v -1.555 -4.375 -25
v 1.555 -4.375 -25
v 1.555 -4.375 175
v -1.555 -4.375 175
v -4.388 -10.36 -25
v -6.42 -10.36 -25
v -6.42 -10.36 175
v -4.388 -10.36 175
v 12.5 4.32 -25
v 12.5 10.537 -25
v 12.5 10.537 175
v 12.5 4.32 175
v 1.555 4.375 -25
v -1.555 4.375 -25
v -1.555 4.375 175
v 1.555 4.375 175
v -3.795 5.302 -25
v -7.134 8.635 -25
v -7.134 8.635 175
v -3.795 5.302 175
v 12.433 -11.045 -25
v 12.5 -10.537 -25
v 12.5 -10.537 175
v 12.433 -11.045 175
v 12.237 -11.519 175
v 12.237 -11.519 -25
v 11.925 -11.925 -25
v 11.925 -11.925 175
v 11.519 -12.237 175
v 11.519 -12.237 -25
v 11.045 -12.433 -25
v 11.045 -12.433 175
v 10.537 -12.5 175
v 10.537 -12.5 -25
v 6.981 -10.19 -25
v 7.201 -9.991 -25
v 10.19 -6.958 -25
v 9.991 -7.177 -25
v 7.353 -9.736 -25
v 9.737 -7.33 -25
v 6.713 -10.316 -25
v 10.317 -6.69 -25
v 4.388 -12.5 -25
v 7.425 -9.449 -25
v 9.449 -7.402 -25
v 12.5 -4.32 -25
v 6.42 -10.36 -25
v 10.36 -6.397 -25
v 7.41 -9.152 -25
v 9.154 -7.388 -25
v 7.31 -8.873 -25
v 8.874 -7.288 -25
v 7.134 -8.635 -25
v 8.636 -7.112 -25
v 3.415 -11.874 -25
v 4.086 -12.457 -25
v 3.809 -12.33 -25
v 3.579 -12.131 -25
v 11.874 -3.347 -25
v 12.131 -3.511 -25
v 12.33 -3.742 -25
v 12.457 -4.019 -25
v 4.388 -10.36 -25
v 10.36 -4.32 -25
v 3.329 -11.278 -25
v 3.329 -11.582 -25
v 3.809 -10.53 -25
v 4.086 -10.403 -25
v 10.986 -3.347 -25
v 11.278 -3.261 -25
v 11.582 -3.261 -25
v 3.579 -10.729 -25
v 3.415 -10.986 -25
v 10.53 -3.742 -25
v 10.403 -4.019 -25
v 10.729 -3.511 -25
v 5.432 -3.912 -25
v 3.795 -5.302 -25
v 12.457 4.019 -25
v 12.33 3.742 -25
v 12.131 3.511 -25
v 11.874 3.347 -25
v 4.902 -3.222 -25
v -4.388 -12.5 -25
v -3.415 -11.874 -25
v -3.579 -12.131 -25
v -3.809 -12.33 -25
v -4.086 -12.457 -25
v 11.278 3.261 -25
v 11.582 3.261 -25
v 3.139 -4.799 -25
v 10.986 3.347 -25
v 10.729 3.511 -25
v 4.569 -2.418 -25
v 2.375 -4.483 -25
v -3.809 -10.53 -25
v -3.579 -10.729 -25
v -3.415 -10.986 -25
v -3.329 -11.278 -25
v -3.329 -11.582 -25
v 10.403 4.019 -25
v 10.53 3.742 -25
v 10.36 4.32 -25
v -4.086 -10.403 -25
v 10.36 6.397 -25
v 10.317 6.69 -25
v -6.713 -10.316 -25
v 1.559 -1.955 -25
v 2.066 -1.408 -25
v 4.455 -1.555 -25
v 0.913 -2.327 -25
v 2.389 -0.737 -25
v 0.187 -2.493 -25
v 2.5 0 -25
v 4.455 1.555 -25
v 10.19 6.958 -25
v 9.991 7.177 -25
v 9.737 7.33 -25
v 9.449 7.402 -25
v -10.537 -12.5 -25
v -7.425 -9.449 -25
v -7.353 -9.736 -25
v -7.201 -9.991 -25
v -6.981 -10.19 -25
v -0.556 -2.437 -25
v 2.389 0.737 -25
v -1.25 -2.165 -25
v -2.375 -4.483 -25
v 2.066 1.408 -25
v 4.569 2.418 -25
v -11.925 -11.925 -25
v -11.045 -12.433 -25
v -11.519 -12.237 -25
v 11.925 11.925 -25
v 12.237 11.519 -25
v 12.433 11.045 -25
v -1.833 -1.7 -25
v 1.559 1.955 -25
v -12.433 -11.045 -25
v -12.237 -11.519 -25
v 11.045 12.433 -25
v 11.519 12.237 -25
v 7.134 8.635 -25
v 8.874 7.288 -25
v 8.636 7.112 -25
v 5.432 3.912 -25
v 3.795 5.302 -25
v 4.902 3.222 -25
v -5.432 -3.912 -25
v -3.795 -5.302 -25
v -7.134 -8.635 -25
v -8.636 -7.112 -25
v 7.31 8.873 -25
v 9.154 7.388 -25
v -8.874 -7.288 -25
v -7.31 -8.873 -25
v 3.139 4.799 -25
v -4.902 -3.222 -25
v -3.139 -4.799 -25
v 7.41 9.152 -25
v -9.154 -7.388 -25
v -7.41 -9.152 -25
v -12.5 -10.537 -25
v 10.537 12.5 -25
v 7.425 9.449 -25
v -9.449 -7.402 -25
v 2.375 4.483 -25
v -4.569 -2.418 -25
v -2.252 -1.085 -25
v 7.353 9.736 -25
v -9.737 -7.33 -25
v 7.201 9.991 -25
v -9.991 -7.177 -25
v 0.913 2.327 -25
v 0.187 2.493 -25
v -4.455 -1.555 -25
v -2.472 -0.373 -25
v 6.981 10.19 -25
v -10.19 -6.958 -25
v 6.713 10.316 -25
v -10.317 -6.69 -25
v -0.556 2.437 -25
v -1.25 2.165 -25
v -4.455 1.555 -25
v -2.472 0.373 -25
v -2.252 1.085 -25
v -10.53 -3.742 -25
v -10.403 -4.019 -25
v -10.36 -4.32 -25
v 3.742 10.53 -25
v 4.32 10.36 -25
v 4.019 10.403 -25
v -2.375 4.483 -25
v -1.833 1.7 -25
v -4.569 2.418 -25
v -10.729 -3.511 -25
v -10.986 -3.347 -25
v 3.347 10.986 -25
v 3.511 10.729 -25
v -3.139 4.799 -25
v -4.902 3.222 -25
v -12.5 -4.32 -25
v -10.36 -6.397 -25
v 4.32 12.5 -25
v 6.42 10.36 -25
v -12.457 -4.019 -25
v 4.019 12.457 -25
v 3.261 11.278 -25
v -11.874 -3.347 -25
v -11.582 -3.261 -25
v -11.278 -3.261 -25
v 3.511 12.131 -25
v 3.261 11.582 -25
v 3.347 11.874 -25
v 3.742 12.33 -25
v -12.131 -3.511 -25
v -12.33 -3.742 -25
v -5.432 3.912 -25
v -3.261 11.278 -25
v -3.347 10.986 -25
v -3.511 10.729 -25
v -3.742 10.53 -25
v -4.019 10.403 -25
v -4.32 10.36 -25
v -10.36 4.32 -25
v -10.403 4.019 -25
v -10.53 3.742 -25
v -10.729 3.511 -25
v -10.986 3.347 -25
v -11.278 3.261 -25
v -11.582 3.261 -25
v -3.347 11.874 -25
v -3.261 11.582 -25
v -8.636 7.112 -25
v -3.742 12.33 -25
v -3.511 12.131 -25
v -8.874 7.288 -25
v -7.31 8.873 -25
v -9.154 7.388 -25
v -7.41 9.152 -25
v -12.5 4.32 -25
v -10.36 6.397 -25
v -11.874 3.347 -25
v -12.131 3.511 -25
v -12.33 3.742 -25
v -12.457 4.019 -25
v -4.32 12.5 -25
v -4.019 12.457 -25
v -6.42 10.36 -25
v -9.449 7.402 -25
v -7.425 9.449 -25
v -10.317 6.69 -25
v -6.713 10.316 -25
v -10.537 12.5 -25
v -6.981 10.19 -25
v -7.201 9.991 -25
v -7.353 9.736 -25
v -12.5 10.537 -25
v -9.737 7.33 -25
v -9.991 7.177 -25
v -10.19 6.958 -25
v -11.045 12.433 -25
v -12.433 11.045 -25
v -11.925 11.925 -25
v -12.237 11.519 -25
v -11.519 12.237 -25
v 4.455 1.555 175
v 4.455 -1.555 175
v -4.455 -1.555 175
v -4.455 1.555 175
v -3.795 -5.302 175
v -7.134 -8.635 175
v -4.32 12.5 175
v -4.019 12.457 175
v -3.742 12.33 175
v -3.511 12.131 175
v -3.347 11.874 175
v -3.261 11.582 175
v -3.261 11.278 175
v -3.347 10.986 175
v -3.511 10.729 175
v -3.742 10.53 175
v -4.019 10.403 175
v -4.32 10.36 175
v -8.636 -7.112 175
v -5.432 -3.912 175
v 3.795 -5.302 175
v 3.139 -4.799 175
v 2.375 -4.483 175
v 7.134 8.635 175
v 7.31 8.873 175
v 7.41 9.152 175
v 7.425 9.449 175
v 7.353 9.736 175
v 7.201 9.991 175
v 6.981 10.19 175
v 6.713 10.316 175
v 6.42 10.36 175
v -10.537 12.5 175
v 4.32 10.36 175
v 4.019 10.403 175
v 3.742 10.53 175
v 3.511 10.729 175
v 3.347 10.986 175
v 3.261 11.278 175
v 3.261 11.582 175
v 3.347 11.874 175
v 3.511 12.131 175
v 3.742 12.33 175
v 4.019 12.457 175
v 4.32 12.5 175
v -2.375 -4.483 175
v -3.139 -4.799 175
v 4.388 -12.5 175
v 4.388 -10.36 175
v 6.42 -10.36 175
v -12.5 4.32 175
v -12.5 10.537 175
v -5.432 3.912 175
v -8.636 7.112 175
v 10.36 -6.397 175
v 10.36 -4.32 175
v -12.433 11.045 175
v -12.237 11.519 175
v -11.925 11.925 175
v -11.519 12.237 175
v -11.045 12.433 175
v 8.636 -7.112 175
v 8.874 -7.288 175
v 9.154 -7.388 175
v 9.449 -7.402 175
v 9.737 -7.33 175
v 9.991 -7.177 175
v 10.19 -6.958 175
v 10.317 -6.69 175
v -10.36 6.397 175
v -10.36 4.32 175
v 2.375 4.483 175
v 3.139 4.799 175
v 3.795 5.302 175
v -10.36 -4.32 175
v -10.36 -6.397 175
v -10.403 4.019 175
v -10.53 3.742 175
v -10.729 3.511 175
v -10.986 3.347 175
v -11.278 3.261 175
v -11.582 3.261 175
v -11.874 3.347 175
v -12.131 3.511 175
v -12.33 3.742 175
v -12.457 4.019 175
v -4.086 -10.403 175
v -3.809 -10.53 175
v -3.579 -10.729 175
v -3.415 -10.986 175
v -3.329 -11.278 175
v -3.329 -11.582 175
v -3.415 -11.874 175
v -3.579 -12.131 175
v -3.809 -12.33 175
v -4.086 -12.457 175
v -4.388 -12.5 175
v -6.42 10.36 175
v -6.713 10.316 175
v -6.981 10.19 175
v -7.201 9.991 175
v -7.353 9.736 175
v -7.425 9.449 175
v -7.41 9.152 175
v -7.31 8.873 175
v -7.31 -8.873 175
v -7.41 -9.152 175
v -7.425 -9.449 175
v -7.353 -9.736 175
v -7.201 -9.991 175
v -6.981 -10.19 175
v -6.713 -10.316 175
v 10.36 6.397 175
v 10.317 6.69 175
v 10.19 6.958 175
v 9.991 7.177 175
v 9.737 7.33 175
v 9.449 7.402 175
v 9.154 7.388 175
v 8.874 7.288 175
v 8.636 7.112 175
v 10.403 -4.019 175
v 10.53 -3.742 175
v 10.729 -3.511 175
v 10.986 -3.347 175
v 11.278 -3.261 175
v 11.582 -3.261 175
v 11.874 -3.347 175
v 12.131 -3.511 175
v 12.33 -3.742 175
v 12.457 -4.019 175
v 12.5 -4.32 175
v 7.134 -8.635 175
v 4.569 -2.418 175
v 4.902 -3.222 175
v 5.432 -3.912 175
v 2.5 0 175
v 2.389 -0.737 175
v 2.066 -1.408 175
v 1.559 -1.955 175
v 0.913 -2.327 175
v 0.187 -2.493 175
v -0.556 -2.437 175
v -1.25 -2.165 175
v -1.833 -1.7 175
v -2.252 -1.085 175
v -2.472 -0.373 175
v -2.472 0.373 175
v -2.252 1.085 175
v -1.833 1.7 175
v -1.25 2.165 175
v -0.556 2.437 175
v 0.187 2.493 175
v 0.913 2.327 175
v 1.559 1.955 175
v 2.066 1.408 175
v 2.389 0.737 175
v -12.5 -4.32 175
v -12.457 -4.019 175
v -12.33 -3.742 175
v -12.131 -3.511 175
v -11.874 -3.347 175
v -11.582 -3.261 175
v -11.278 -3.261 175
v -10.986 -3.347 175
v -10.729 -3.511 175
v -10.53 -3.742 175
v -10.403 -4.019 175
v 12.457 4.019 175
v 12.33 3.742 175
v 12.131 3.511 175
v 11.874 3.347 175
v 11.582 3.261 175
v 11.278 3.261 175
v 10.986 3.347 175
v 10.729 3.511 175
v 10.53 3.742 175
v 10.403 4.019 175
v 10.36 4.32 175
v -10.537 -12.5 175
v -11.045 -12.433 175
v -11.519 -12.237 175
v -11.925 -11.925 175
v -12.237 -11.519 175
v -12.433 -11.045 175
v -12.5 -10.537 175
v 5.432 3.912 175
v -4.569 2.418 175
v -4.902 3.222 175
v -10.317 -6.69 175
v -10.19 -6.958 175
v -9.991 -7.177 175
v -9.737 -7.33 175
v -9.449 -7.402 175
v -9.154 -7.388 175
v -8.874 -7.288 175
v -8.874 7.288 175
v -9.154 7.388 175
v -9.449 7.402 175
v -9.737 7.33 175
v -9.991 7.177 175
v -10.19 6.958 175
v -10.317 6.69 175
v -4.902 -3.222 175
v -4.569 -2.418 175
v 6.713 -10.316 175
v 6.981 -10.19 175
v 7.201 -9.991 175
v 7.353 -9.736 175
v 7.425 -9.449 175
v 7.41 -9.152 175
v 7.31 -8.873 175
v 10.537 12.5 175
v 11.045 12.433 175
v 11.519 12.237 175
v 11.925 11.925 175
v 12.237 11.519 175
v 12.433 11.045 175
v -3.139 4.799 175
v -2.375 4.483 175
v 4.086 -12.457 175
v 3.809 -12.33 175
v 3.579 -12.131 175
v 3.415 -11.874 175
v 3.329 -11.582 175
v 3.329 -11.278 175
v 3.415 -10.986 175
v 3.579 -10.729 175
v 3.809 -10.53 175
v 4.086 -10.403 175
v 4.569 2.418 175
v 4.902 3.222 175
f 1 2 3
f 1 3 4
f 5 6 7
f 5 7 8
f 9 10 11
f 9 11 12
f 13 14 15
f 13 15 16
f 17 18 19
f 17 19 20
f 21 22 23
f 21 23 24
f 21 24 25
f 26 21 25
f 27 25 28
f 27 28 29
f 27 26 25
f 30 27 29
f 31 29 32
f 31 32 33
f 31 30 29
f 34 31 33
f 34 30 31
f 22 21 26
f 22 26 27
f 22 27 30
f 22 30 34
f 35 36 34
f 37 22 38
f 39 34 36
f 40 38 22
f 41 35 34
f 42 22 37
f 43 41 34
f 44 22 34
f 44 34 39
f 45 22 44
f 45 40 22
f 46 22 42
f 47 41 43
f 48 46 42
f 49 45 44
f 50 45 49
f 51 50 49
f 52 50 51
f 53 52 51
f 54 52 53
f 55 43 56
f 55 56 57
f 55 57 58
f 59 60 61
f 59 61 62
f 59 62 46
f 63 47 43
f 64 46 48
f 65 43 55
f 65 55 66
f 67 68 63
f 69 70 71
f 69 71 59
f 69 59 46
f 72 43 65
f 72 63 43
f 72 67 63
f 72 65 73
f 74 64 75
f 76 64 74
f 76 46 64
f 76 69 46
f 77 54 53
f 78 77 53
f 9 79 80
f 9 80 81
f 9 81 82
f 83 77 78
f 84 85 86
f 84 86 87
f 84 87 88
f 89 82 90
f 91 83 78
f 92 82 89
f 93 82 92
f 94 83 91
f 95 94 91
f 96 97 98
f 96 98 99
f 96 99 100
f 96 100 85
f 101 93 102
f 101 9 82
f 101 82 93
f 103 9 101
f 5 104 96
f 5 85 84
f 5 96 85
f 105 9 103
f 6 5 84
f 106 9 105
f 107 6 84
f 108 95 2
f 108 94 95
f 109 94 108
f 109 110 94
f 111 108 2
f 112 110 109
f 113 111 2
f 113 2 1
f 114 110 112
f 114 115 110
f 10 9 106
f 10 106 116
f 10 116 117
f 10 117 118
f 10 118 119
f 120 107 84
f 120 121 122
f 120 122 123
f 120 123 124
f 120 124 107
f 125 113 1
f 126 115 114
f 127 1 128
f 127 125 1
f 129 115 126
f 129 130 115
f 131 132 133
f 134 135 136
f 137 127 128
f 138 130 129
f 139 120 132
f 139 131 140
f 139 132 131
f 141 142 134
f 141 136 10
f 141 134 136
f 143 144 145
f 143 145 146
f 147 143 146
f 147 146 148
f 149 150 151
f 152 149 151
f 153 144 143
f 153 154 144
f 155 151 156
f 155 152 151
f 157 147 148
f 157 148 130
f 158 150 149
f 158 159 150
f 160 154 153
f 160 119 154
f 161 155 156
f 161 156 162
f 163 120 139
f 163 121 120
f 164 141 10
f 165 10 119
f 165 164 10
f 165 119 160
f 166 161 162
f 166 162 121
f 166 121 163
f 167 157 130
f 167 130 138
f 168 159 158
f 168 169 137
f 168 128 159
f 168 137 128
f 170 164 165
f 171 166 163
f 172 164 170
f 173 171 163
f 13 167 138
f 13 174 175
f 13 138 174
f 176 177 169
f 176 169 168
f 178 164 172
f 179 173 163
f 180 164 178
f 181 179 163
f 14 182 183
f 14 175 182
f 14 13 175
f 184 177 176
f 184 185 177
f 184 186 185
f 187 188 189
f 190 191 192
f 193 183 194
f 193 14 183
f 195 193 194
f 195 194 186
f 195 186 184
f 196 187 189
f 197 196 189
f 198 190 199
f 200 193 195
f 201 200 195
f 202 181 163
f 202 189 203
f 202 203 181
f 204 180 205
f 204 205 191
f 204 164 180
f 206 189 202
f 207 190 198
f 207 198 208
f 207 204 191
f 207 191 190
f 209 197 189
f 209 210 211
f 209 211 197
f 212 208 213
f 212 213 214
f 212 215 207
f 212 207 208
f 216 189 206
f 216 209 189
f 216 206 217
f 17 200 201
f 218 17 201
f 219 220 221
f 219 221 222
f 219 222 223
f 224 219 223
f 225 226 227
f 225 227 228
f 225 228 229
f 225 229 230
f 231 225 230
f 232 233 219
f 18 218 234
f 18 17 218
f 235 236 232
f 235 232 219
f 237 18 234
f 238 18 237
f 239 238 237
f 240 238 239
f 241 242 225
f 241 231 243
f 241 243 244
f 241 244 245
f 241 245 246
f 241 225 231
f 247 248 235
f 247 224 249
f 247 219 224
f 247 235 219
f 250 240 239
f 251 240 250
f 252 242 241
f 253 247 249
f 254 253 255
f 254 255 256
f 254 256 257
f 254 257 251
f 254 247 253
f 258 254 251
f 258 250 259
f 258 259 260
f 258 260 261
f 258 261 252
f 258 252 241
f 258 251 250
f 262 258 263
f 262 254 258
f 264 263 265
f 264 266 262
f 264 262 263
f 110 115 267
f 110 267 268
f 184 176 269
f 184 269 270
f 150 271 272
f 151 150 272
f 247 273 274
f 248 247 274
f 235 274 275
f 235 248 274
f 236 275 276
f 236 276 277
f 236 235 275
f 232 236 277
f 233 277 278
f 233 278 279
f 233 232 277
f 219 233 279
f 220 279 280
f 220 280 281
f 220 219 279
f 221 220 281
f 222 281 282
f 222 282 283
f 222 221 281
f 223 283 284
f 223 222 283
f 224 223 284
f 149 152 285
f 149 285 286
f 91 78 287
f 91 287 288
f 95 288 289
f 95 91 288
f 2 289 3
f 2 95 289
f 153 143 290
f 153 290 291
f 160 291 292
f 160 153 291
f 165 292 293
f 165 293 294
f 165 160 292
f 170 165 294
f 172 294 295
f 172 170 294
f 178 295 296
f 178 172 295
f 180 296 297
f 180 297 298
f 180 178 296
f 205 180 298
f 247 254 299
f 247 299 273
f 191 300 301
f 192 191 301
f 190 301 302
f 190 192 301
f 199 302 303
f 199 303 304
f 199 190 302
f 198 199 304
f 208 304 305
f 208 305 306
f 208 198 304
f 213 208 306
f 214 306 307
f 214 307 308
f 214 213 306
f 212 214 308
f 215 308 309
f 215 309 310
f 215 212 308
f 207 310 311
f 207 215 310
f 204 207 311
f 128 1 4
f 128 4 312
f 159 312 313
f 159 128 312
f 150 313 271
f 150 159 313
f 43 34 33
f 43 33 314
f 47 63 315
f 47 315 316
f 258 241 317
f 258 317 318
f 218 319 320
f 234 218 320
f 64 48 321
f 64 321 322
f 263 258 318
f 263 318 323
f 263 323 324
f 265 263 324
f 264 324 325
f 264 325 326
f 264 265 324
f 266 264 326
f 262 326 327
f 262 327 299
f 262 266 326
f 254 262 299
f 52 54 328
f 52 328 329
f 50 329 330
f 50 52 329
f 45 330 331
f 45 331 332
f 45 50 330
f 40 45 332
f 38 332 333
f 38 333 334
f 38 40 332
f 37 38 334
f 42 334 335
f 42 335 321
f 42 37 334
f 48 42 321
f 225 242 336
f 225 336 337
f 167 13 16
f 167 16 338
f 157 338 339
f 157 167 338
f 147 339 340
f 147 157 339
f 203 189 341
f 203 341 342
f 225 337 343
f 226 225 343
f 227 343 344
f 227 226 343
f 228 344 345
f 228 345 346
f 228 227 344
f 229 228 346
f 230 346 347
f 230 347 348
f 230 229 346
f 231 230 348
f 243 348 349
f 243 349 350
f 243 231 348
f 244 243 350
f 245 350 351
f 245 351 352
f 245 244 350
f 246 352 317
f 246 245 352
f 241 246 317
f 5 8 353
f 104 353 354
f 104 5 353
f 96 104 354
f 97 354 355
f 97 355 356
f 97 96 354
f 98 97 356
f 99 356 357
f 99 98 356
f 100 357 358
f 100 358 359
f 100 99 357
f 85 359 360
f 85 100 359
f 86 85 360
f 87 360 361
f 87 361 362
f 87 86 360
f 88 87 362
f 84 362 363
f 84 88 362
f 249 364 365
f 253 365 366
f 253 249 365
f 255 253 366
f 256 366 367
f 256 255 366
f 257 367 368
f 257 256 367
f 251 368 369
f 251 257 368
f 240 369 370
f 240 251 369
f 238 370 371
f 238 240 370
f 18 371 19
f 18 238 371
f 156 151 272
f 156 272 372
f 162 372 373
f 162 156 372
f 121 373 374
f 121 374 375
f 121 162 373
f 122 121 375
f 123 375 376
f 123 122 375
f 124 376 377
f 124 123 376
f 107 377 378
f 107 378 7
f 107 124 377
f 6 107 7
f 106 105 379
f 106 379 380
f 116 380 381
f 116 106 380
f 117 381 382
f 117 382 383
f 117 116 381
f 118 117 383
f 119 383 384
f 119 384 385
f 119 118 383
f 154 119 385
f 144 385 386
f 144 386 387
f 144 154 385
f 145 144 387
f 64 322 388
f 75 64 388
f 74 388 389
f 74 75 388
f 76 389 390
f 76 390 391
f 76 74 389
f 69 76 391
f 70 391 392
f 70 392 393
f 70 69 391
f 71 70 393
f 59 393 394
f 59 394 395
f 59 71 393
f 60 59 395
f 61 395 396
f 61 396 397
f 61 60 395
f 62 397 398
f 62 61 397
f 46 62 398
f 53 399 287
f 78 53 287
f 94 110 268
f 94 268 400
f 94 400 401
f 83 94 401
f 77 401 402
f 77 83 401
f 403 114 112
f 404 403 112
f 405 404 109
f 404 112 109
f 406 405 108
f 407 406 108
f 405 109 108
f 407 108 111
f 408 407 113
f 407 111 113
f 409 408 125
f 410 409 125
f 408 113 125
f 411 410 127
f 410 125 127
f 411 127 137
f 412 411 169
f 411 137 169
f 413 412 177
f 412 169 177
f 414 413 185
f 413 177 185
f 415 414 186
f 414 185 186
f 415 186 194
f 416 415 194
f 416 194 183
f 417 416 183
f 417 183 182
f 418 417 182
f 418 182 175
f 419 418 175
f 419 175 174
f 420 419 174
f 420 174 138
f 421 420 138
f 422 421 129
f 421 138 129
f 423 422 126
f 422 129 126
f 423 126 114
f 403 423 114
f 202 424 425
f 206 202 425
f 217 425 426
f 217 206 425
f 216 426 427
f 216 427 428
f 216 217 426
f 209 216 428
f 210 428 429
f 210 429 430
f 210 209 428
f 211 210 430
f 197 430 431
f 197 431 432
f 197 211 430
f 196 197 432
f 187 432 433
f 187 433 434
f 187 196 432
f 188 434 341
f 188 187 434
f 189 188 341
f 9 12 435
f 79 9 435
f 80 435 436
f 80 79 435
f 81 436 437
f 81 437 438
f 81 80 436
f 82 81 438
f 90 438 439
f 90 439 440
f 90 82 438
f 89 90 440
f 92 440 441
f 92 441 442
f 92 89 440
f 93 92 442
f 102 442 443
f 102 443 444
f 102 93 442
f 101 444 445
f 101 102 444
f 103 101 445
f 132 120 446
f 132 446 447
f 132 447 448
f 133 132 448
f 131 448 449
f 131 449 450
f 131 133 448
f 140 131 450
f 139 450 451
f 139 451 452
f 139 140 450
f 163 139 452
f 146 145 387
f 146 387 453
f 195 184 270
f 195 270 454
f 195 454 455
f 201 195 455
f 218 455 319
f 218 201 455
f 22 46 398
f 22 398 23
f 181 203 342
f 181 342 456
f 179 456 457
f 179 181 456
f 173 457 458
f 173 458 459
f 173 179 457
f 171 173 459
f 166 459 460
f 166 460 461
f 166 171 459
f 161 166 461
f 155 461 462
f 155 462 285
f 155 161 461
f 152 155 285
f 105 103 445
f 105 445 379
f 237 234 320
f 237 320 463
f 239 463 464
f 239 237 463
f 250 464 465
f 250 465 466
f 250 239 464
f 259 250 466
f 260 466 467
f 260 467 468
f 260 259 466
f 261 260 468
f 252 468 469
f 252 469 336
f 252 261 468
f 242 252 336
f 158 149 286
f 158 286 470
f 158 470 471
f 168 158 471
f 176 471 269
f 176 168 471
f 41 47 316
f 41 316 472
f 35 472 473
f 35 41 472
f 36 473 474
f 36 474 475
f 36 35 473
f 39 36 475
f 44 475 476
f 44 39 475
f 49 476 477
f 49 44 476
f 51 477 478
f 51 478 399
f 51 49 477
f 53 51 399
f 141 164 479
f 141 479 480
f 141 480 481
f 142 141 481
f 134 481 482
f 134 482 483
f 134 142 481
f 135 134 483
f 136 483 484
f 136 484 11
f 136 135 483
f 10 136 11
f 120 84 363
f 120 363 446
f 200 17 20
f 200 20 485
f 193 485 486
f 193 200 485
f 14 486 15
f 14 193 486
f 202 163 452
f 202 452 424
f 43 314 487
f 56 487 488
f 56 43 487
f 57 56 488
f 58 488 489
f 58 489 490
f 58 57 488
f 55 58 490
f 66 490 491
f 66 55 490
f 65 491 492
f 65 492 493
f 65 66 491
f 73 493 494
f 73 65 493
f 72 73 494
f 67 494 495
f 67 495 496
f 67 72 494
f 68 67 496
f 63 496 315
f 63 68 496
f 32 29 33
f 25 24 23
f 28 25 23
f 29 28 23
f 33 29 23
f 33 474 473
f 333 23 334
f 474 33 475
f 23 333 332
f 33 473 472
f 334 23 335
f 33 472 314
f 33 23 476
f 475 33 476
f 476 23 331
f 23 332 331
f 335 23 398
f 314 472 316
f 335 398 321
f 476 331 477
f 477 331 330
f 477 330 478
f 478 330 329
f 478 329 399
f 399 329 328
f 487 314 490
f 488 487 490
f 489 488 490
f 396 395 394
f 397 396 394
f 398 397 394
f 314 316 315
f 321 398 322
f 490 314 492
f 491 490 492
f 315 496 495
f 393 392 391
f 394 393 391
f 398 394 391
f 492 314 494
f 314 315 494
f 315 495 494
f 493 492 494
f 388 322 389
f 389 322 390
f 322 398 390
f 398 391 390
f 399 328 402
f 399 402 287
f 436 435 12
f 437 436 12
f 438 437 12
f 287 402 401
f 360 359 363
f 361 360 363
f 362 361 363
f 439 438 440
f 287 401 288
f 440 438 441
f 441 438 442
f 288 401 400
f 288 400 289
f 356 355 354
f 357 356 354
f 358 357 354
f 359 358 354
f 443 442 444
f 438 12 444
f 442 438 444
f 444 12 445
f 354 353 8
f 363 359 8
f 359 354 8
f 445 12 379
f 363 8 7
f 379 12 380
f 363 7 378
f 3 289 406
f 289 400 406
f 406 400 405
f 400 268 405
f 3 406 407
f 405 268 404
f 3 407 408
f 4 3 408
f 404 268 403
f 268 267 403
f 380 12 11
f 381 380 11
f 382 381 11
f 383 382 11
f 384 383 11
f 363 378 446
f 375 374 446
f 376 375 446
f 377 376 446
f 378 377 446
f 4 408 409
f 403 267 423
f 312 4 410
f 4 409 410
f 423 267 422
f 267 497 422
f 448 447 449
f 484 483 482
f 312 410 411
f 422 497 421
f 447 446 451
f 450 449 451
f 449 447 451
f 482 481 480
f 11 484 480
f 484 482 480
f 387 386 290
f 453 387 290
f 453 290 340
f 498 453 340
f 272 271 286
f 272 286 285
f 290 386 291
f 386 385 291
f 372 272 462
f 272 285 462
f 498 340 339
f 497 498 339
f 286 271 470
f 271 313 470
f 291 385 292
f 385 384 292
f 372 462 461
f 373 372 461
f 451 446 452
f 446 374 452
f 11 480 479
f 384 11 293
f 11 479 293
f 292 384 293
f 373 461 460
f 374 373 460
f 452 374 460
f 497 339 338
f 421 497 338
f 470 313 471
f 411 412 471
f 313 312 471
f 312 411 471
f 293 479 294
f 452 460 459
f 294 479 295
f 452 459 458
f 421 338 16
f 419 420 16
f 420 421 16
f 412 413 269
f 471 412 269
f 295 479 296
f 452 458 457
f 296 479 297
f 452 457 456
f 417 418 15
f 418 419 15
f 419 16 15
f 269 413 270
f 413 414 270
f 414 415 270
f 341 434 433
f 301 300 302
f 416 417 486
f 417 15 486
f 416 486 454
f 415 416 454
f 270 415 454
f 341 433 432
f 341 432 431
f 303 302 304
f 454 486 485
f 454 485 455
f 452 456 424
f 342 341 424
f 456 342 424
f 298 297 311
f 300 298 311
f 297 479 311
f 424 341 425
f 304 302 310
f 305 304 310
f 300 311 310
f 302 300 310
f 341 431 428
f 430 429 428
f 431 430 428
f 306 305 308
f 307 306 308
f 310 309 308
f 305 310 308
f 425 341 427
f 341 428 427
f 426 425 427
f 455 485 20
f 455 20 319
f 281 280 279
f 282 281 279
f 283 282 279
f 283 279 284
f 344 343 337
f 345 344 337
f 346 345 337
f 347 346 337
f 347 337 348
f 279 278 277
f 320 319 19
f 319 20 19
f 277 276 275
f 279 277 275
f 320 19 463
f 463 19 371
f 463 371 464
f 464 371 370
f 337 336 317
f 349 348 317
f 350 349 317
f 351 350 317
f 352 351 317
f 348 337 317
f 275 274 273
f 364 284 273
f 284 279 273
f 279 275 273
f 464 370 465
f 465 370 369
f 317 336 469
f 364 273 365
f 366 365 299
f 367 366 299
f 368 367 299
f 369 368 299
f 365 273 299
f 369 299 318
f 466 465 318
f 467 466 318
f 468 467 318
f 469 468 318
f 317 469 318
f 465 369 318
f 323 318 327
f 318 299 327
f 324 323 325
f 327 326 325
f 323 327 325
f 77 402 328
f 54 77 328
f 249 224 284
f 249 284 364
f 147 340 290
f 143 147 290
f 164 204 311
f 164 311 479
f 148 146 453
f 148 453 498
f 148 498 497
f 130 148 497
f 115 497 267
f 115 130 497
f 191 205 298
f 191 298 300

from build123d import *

# Parameters (mm, degrees)
SKETCH1_R           = 2.5
BOSS_EXTRUDE1_DEPTH = 200


with BuildPart() as part:
    # Sketch1 → Boss-Extrude1 (new body)
    with BuildSketch(Plane(origin=(0, 0, -25), x_dir=(-1, 0, 0), z_dir=(0, 0, -1))):
        with BuildLine():
            Line((12.5, 4.32), (12.5, 10.537068835))
            ThreePointArc((12.5, 10.537068835), (11.925070773, 11.925070773), (10.537068835, 12.5))
            Line((10.537068835, 12.5), (4.32, 12.5))
            ThreePointArc((4.32, 12.5), (3.25, 11.43), (4.32, 10.36))
            Line((4.32, 10.36), (6.42, 10.36))
            ThreePointArc((6.42, 10.36), (7.35325999, 9.736168088), (7.133653911, 8.635298598))
            Line((7.133653911, 8.635298598), (3.795290766, 5.301828272))
            ThreePointArc((3.795290766, 5.301828272), (2.76743922, 4.61585726), (1.555406707, 4.375))
            Line((1.555406707, 4.375), (-1.555406707, 4.375))
            ThreePointArc((-1.555406707, 4.375), (-2.76743922, 4.61585726), (-3.795290766, 5.301828272))
            Line((-3.795290766, 5.301828272), (-7.133653912, 8.635298598))
            ThreePointArc((-7.133653912, 8.635298598), (-7.35325999, 9.736168088), (-6.42, 10.36))
            Line((-6.42, 10.36), (-4.32, 10.36))
            ThreePointArc((-4.32, 10.36), (-3.25, 11.43), (-4.32, 12.5))
            Line((-4.32, 12.5), (-10.537068835, 12.5))
            ThreePointArc((-10.537068835, 12.5), (-11.925070773, 11.925070773), (-12.5, 10.537068835))
            Line((-12.5, 10.537068835), (-12.5, 4.32))
            ThreePointArc((-12.5, 4.32), (-11.43, 3.25), (-10.36, 4.32))
            Line((-10.36, 4.32), (-10.36, 6.396886949))
            ThreePointArc((-10.36, 6.396886949), (-9.736852394, 7.329863489), (-8.636346088, 7.111588351))
            Line((-8.636346088, 7.111588351), (-5.432204773, 3.912143135))
            ThreePointArc((-5.432204773, 3.912143135), (-4.708985779, 2.831057106), (-4.455, 1.555406707))
            Line((-4.455, 1.555406707), (-4.455, -1.555406707))
            ThreePointArc((-4.455, -1.555406707), (-4.708985779, -2.831057106), (-5.432204773, -3.912143135))
            Line((-5.432204773, -3.912143135), (-8.636346088, -7.111588351))
            ThreePointArc((-8.636346088, -7.111588351), (-9.736852394, -7.329863489), (-10.36, -6.396886949))
            Line((-10.36, -6.396886949), (-10.36, -4.32))
            ThreePointArc((-10.36, -4.32), (-11.43, -3.25), (-12.5, -4.32))
            Line((-12.5, -4.32), (-12.5, -10.537068835))
            ThreePointArc((-12.5, -10.537068835), (-11.925070773, -11.925070773), (-10.537068835, -12.5))
            Line((-10.537068835, -12.5), (-4.387856959, -12.5))
            ThreePointArc((-4.387856959, -12.5), (-3.317856959, -11.43), (-4.387856959, -10.36))
            Line((-4.387856959, -10.36), (-6.42, -10.36))
            ThreePointArc((-6.42, -10.36), (-7.35325999, -9.736168088), (-7.133653912, -8.635298598))
            Line((-7.133653912, -8.635298598), (-3.795290766, -5.301828272))
            ThreePointArc((-3.795290766, -5.301828272), (-2.76743922, -4.61585726), (-1.555406707, -4.375))
            Line((-1.555406707, -4.375), (1.555406707, -4.375))
            ThreePointArc((1.555406707, -4.375), (2.76743922, -4.61585726), (3.795290766, -5.301828272))
            Line((3.795290766, -5.301828272), (7.133653912, -8.635298598))
            ThreePointArc((7.133653912, -8.635298598), (7.35325999, -9.736168088), (6.42, -10.36))
            Line((6.42, -10.36), (4.387856959, -10.36))
            ThreePointArc((4.387856959, -10.36), (3.317856959, -11.43), (4.387856959, -12.5))
            Line((4.387856959, -12.5), (10.537068835, -12.5))
            ThreePointArc((10.537068835, -12.5), (11.925070773, -11.925070773), (12.5, -10.537068835))
            Line((12.5, -10.537068835), (12.5, -4.32))
            ThreePointArc((12.5, -4.32), (11.43, -3.25), (10.36, -4.32))
            Line((10.36, -4.32), (10.36, -6.396886949))
            ThreePointArc((10.36, -6.396886949), (9.736852394, -7.329863489), (8.636346088, -7.111588351))
            Line((8.636346088, -7.111588351), (5.432204773, -3.912143135))
            ThreePointArc((5.432204773, -3.912143135), (4.708985779, -2.831057106), (4.455, -1.555406707))
            Line((4.455, -1.555406707), (4.455, 1.555406707))
            ThreePointArc((4.455, 1.555406707), (4.708985779, 2.831057106), (5.432204773, 3.912143135))
            Line((5.432204773, 3.912143135), (8.636346088, 7.111588351))
            ThreePointArc((8.636346088, 7.111588351), (9.736852394, 7.329863489), (10.36, 6.396886949))
            Line((10.36, 6.396886949), (10.36, 4.32))
            ThreePointArc((10.36, 4.32), (11.43, 3.25), (12.5, 4.32))
        make_face()
        with Locations(Location((0, 0, 0), (0, 0, 180))):
            Circle(SKETCH1_R, mode=Mode.SUBTRACT)
    extrude(amount=-BOSS_EXTRUDE1_DEPTH)


solid = part.part
